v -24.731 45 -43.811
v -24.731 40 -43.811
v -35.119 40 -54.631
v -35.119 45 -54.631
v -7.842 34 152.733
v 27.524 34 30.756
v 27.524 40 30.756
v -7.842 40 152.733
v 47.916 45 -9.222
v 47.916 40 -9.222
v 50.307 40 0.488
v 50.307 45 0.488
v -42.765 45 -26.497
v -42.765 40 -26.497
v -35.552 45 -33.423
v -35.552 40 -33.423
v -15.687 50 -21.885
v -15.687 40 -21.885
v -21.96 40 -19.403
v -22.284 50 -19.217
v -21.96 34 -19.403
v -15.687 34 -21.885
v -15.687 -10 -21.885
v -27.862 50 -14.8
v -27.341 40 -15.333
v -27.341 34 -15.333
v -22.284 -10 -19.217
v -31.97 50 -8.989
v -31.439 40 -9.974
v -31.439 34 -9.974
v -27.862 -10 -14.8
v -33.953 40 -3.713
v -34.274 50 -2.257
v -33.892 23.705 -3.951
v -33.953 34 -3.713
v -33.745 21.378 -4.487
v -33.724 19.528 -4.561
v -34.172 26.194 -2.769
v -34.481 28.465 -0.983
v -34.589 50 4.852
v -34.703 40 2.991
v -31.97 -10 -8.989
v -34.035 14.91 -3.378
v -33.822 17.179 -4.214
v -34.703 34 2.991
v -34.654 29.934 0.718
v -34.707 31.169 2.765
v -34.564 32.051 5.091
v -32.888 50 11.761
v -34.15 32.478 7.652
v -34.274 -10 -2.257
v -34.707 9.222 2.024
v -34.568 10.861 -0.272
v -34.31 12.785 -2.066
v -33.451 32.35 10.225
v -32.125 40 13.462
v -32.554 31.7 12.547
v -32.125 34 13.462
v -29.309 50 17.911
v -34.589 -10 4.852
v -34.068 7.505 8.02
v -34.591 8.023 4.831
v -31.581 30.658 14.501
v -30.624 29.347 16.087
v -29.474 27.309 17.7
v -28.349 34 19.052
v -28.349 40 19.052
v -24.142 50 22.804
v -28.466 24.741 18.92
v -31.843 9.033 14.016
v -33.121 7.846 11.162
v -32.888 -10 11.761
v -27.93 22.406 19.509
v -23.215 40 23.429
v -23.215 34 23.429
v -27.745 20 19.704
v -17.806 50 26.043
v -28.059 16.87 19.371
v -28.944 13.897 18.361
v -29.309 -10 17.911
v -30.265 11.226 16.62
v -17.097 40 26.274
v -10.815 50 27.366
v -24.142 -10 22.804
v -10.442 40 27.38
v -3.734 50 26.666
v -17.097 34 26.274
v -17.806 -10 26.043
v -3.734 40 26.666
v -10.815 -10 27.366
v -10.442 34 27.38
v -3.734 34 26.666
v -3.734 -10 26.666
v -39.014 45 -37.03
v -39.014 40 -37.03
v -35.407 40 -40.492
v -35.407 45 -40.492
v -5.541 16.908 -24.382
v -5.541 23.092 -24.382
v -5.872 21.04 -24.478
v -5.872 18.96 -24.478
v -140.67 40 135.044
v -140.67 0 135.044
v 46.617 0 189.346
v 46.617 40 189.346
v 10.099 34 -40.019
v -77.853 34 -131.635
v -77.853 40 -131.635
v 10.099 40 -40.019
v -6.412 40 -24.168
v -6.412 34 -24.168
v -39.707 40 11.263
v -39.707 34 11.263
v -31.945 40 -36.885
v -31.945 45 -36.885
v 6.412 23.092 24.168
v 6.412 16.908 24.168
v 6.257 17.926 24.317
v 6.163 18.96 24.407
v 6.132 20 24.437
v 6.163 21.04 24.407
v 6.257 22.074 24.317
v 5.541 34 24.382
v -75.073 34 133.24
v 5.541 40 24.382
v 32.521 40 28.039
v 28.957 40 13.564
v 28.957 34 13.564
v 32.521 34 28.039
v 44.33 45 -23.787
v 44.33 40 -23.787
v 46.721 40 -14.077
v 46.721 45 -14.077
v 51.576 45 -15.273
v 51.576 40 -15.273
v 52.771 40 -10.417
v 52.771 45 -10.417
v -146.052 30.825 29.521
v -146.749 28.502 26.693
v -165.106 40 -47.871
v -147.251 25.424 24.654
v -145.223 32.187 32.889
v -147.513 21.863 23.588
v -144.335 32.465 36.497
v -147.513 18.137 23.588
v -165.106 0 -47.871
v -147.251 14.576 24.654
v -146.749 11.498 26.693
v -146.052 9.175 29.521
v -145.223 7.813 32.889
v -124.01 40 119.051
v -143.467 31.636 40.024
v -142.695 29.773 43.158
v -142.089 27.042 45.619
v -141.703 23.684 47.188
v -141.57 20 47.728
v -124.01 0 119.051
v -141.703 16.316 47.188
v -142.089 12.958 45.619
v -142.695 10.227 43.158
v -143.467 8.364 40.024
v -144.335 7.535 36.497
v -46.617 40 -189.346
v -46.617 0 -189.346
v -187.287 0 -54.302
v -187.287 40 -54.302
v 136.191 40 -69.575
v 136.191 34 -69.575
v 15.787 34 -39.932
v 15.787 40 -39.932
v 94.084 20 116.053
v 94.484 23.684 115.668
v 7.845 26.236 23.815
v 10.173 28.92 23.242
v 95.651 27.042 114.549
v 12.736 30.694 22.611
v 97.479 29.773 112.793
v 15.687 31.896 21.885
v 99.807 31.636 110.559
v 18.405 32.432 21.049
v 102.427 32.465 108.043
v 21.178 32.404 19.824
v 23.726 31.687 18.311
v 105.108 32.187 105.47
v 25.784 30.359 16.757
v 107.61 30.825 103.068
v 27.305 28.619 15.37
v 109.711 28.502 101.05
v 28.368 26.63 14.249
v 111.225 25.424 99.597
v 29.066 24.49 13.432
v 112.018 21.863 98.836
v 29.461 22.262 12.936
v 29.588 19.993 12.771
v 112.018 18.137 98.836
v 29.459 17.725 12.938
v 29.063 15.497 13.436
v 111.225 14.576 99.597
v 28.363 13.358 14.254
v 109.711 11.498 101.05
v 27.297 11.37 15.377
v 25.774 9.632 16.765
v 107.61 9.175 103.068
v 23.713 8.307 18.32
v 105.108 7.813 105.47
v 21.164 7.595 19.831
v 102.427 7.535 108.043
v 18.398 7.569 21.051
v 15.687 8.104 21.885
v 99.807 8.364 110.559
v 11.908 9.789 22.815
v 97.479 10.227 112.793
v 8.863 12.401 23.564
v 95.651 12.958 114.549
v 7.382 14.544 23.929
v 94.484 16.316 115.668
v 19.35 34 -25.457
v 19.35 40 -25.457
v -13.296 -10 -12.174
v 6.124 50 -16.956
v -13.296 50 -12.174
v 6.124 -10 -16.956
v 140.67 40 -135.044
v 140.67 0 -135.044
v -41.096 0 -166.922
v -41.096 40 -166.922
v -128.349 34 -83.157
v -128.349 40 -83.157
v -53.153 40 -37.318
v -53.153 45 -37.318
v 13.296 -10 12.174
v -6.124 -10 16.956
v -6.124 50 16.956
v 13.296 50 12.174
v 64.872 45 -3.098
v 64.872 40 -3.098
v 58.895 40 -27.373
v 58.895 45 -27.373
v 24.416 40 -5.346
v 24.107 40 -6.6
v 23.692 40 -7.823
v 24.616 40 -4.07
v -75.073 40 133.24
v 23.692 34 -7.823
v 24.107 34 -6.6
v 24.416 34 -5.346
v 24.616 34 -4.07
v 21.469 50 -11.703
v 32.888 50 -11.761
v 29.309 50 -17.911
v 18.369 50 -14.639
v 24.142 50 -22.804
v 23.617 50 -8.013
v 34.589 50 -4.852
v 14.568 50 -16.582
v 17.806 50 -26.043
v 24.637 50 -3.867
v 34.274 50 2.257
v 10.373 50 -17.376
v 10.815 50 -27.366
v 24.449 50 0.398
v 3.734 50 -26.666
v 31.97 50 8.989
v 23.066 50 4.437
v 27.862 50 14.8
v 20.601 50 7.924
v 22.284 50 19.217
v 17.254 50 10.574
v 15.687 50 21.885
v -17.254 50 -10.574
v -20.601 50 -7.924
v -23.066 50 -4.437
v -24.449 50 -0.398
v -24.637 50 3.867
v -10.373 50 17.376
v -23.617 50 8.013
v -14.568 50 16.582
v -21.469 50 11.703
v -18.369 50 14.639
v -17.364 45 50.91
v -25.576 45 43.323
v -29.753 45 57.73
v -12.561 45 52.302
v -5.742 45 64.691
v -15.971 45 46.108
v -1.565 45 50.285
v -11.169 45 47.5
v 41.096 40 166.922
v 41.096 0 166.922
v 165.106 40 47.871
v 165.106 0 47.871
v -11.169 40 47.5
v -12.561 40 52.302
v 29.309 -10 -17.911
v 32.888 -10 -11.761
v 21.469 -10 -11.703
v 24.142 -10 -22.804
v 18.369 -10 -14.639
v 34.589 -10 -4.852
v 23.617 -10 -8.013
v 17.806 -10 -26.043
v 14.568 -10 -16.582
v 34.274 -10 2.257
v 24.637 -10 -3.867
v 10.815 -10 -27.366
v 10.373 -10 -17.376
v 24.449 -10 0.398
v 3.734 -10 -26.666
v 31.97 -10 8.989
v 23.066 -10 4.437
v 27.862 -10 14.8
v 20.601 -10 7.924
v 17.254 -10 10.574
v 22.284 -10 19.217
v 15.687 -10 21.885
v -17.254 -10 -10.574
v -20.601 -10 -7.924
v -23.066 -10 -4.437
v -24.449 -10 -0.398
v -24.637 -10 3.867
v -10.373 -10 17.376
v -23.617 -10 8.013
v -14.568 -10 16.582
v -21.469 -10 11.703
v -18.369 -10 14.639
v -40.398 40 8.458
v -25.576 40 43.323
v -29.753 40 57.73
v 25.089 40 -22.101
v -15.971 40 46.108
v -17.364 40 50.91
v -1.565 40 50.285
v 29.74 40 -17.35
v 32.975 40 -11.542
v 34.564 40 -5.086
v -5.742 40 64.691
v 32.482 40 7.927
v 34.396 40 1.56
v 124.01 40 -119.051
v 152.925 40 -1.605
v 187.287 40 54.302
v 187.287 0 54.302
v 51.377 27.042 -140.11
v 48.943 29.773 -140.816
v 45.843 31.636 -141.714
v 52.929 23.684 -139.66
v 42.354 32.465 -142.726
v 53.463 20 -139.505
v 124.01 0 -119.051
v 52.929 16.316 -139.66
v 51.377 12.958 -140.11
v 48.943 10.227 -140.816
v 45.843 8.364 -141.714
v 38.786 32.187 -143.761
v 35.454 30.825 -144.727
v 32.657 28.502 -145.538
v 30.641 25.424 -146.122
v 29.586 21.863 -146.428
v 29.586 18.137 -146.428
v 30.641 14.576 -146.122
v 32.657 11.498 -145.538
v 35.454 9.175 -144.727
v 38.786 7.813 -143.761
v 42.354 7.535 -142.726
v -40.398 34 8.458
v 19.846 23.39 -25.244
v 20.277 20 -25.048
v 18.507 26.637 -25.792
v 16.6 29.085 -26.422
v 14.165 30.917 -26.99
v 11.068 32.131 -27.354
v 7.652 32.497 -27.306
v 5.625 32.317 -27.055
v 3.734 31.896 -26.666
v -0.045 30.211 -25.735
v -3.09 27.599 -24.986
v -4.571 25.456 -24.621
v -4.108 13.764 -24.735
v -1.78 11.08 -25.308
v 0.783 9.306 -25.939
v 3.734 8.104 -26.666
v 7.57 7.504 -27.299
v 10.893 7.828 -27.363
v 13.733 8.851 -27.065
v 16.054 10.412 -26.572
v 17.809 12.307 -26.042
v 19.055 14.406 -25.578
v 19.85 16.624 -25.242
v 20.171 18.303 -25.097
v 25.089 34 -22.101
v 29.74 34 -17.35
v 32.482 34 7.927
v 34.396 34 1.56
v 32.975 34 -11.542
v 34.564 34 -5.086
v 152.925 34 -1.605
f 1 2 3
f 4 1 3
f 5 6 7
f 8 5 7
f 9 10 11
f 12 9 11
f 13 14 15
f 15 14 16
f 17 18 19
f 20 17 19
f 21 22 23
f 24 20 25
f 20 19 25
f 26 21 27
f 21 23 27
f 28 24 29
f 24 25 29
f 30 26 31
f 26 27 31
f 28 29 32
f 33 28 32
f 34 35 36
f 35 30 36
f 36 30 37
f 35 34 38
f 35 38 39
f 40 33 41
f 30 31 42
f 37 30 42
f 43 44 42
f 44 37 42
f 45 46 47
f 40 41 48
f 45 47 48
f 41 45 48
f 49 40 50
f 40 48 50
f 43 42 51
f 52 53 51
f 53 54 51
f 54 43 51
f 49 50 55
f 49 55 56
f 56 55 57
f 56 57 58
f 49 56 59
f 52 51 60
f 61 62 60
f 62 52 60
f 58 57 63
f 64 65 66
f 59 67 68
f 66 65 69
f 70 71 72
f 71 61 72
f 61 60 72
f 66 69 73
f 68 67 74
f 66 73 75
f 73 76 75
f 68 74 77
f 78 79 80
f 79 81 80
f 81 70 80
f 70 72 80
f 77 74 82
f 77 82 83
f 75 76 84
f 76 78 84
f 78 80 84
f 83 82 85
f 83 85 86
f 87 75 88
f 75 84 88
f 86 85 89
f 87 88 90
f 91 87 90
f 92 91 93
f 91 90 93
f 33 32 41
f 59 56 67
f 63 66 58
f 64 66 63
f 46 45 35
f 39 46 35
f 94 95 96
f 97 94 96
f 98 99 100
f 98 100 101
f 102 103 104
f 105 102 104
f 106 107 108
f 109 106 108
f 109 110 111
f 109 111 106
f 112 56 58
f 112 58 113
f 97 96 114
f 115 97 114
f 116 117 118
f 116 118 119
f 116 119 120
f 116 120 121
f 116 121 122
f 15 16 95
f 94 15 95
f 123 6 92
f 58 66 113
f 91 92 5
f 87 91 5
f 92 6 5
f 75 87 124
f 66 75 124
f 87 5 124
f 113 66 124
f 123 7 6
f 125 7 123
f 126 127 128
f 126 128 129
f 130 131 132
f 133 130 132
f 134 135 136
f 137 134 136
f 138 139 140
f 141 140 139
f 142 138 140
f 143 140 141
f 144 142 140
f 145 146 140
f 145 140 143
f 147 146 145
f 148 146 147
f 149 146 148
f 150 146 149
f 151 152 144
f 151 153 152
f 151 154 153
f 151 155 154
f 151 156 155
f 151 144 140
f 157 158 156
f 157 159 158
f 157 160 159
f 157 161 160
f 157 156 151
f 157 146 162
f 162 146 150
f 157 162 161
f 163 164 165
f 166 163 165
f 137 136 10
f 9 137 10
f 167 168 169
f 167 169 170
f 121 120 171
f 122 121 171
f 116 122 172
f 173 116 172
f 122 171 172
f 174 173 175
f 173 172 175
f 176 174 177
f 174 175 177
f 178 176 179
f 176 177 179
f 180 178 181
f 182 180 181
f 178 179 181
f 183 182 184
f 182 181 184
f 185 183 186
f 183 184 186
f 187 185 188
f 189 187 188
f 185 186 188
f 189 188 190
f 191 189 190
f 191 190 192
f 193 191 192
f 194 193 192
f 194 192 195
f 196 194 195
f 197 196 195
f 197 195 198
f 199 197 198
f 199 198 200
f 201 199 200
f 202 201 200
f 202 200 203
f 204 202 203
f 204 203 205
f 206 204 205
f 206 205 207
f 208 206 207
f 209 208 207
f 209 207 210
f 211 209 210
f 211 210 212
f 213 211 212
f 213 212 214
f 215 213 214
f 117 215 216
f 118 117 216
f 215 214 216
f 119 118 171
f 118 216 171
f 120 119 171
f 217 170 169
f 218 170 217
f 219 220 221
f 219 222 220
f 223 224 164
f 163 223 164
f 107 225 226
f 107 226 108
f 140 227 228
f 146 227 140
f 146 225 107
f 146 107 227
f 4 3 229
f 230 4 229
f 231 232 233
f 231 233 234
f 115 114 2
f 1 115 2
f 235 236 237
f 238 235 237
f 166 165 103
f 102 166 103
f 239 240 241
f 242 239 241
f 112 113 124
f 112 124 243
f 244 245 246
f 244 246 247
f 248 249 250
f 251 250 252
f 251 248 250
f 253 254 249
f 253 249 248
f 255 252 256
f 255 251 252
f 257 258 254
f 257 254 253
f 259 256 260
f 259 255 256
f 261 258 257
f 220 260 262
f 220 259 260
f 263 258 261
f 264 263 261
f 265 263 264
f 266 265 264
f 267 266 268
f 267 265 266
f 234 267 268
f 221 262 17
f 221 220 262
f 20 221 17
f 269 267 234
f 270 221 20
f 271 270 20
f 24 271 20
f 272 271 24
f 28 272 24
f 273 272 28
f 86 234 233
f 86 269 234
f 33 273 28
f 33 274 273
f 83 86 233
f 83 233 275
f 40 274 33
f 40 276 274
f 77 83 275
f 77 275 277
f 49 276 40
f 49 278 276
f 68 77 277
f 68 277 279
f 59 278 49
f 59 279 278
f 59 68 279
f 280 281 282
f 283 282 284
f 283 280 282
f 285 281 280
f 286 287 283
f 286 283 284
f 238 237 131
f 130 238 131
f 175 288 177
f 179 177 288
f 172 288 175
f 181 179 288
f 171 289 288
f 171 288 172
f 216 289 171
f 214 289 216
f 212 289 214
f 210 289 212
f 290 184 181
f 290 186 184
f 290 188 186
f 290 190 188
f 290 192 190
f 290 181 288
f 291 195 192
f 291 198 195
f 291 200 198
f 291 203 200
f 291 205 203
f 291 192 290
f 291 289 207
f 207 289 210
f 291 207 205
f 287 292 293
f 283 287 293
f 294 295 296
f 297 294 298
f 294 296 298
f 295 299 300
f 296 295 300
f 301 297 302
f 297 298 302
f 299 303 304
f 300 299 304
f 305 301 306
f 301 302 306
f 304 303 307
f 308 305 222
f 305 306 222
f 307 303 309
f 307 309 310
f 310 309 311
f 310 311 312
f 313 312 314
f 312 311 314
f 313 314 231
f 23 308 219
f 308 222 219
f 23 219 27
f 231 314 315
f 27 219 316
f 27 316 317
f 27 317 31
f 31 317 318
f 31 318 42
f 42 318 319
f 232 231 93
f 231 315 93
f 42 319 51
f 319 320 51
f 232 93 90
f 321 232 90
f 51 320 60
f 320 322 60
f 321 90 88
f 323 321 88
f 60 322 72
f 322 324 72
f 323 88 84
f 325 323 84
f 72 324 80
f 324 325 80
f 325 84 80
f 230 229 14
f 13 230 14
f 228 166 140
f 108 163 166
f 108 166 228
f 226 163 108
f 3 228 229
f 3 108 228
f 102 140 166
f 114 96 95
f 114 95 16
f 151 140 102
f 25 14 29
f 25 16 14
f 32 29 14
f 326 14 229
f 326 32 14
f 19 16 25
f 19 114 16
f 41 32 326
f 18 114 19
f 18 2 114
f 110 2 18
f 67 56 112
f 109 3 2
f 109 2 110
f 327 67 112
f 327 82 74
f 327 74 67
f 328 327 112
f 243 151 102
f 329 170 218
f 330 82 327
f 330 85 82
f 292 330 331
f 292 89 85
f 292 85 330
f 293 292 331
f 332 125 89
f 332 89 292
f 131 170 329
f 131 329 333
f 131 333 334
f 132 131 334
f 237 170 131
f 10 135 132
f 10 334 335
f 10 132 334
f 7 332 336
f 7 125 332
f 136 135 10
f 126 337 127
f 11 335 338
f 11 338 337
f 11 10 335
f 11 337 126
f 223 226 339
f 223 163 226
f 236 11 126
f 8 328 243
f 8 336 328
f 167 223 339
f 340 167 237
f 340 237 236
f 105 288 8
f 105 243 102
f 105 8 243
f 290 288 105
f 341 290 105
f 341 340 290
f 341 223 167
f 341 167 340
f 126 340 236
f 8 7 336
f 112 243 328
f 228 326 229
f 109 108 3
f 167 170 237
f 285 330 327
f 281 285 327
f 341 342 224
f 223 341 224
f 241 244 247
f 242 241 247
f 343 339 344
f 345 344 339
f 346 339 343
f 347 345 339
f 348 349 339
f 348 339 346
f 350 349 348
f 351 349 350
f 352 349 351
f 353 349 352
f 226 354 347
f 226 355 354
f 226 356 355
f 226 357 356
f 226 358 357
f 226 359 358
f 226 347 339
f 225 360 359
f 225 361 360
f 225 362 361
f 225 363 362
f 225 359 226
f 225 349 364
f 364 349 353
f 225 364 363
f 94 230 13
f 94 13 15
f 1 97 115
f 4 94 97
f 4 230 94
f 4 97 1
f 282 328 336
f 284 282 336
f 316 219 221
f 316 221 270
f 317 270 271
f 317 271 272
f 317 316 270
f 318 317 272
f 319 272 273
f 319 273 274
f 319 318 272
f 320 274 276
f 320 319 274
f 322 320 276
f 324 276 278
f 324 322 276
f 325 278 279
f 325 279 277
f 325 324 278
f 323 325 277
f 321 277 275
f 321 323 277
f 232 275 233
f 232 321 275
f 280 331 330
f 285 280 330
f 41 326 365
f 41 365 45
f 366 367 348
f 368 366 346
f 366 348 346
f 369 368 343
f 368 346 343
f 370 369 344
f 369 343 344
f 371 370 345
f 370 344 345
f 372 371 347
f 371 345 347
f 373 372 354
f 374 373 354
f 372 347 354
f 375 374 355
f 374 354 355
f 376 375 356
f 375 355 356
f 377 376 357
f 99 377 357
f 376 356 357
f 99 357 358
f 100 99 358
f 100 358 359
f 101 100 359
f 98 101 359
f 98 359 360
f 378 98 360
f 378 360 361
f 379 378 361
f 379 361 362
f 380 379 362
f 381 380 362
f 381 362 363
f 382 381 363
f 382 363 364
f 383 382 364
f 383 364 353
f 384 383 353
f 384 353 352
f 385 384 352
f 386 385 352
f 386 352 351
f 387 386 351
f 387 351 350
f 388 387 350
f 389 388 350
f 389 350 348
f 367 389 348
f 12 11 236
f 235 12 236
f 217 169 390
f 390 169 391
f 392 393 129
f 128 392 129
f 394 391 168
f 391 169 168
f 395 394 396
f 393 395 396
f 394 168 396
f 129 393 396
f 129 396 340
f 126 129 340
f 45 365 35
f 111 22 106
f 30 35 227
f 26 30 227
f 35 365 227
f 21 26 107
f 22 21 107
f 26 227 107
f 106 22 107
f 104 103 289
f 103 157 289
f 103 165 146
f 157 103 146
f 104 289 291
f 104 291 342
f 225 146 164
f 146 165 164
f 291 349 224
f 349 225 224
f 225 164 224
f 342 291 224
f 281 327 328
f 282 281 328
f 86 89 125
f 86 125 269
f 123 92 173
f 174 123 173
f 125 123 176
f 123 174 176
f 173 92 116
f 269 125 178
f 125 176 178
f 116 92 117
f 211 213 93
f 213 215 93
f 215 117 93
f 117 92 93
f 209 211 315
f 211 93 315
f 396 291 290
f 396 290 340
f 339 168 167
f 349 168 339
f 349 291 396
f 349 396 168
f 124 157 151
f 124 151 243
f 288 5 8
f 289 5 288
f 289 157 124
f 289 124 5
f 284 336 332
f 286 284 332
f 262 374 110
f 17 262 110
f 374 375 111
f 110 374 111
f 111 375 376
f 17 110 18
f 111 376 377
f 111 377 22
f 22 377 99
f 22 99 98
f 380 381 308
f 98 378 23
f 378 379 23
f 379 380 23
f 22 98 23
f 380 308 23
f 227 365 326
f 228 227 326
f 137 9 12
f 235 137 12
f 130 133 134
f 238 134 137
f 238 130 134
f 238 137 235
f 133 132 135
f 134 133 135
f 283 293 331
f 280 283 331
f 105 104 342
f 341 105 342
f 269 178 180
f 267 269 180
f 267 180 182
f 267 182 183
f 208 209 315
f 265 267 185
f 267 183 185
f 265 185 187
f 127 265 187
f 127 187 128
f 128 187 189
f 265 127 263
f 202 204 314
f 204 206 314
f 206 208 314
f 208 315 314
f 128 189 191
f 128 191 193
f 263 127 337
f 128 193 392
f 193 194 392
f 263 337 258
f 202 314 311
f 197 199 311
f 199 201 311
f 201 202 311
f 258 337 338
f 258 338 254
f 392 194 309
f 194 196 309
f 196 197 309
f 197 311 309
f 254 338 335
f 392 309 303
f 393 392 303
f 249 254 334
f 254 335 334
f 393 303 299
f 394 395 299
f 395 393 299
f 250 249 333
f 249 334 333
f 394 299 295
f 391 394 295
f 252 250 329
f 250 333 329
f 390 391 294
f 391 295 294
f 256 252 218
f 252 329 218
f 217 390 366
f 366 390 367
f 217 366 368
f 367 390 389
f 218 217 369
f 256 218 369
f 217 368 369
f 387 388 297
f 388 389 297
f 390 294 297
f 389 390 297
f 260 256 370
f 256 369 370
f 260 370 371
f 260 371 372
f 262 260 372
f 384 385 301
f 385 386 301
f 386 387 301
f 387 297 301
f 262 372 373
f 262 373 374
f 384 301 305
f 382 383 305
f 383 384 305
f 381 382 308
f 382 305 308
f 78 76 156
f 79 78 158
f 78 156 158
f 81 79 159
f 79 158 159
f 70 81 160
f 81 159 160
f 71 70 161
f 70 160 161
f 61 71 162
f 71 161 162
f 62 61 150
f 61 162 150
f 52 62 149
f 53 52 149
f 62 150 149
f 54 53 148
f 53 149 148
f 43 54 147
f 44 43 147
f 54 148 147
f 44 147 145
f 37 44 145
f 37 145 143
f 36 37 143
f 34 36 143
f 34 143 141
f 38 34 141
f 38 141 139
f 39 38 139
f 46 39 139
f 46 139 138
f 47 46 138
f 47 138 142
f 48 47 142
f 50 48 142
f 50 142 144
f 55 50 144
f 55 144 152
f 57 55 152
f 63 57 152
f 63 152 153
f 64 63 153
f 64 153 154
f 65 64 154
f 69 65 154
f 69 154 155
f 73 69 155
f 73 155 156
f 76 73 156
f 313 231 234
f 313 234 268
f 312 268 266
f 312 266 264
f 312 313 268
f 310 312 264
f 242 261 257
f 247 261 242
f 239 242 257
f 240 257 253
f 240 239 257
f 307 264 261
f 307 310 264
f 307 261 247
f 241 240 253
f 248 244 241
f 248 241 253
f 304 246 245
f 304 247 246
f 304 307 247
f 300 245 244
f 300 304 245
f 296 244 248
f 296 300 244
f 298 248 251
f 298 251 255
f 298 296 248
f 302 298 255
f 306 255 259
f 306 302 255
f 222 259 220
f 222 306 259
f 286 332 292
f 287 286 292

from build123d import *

# Parameters (mm, degrees)
BOSS_EXTRUDE5_DEPTH      = 40
BOSS_EXTRUDE9_DEPTH      = 10
BOSS_EXTRUDE9_DEPTH_BACK = 50
BOSS_EXTRUDE10_DEPTH     = 120
SKETCH5_R                = 12.5
BOSS_EXTRUDE11_DEPTH     = 127
BOSS_EXTRUDE12_DEPTH     = 127
SKETCH8_W                = 70
SKETCH8_H                = 6
BOSS_EXTRUDE14_DEPTH     = 127
SKETCH9_W                = 70
SKETCH9_H                = 6
BOSS_EXTRUDE15_DEPTH     = 127
SKETCH10_W               = 70
SKETCH10_H               = 6
BOSS_EXTRUDE16_DEPTH     = 124
EXTRUDE_THIN1_DEPTH      = 5


with BuildPart() as part:
    # Sketch1 → Boss-Extrude5 (new body)
    with BuildSketch(Plane(origin=(0, 0, 0), x_dir=(1, 0, 0), z_dir=(0, 1, 0))):
        Polygon((-140.670056302, -135.044197431), (46.616677458, -189.345941025), (187.28673376, -54.301743594), (140.670056302, 135.044197431), (-46.616677458, 189.345941025), (-187.28673376, 54.301743594), align=None)
        Polygon((165.106211473, -47.870743331), (124.010385559, 119.050801792), (-41.095825913, 166.921545124), (-165.106211473, 47.870743331), (-124.010385559, -119.050801792), (41.095825913, -166.921545124), align=None, mode=Mode.SUBTRACT)
    extrude(amount=BOSS_EXTRUDE5_DEPTH)



with BuildPart() as body_2:
    # Sketch3 → Boss-Extrude9 (new body, two sides)
    with BuildSketch(Plane.XZ) as boss_extrude9_sk:
        with BuildLine():
            Line((3.733551148, -26.665719488), (-15.686545368, -21.8845218))
            ThreePointArc((-15.686545368, -21.8845218), (-33.985168902, 8.367095954), (-3.733551148, 26.665719488))
            Line((-3.733551148, 26.665719488), (15.686545368, 21.8845218))
            ThreePointArc((15.686545368, 21.8845218), (33.985168902, -8.367095954), (3.733551148, -26.665719488))
        make_face()
        with BuildLine():
            Line((6.124149992, -16.955671231), (-13.295946524, -12.174473543))
            ThreePointArc((-13.295946524, -12.174473543), (-24.275120644, 5.97649711), (-6.124149992, 16.955671231))
            Line((-6.124149992, 16.955671231), (13.295946524, 12.174473543))
            ThreePointArc((13.295946524, 12.174473543), (24.275120644, -5.97649711), (6.124149992, -16.955671231))
        make_face(mode=Mode.SUBTRACT)
    extrude(amount=BOSS_EXTRUDE9_DEPTH)
    extrude(boss_extrude9_sk.sketch, amount=-BOSS_EXTRUDE9_DEPTH_BACK)


with BuildPart() as part_1:
    add(part.part)

    add(body_2.part)  # Boss-Extrude10 merges body 2
    # Sketch4 → Boss-Extrude10 (add)
    with BuildSketch(Plane(origin=(-144.558298516, 0, 35.590029231), x_dir=(-0.239059884, 0, -0.971004826), z_dir=(0.971004826, 0, -0.239059884))):
        with BuildLine():
            ThreePointArc((12.5, 20), (0, 32.5), (-12.5, 20))
            Line((-12.5, 20), (12.5, 20))
        make_face()
        with BuildLine():
            Line((12.5, 20), (-12.5, 20))
            ThreePointArc((-12.5, 20), (0, 7.5), (12.5, 20))
        make_face()
    extrude(amount=BOSS_EXTRUDE10_DEPTH)

    # Sketch5 → Boss-Extrude11 (add)
    with BuildSketch(Plane(origin=(41.457279823, 0, -142.986173458), x_dir=(0.960444789, 0, 0.27847048), z_dir=(-0.27847048, 0, 0.960444789))):
        with Locations((0, 20)):
            Circle(SKETCH5_R)
    extrude(amount=BOSS_EXTRUDE11_DEPTH)

    # Sketch6 → Boss-Extrude12 (add)
    with BuildSketch(Plane(origin=(103.101018693, 0, 107.396144227), x_dir=(-0.721384904, 0, 0.692534346), z_dir=(-0.692534346, 0, -0.721384904))):
        with BuildLine():
            ThreePointArc((-12.5, 20), (0, 7.5), (12.5, 20))
            Line((12.5, 20), (-12.5, 20))
        make_face()
        with BuildLine():
            Line((-12.5, 20), (12.5, 20))
            ThreePointArc((12.5, 20), (0, 32.5), (-12.5, 20))
        make_face()
    extrude(amount=BOSS_EXTRUDE12_DEPTH)

    # Sketch8 → Boss-Extrude14 (add)
    with BuildSketch(Plane(origin=(-103.101018693, 0, -107.396144227), x_dir=(0.721384904, 0, -0.692534346), z_dir=(0.692534346, 0, 0.721384904))):
        with Locations((0, 37)):
            Rectangle(SKETCH8_W, SKETCH8_H)
    extrude(amount=BOSS_EXTRUDE14_DEPTH)

    # Sketch9 → Boss-Extrude15 (add)
    with BuildSketch(Plane(origin=(-41.457279823, 0, 142.986173458), x_dir=(-0.960444789, 0, -0.27847048), z_dir=(0.27847048, 0, -0.960444789))):
        with Locations((0, 37)):
            Rectangle(SKETCH9_W, SKETCH9_H)
    extrude(amount=BOSS_EXTRUDE15_DEPTH)

    # Sketch10 → Boss-Extrude16 (add)
    with BuildSketch(Plane(origin=(144.558298516, 0, -35.590029231), x_dir=(0.239059884, 0, 0.971004826), z_dir=(-0.971004826, 0, 0.239059884))):
        with Locations((0, 37)):
            Rectangle(SKETCH10_W, SKETCH10_H)
    extrude(amount=BOSS_EXTRUDE16_DEPTH)

    # Sketch14 → Extrude-Thin1 (add)
    with BuildSketch(Plane(origin=(0, 40, 0), x_dir=(1, 0, 0), z_dir=(0, 1, 0))):
        Polygon((50.306594431, -0.487856845), (64.871666817, 3.098041421), (58.895169707, 27.373162065), (44.330097321, 23.787263799), (46.720696165, 14.077215541), (51.575720293, 15.272514963), (52.771019715, 10.417490835), (47.915995587, 9.222191413), align=None)
        Polygon((-25.575793637, -43.322860332), (-29.752850836, -57.72953216), (-5.741731123, -64.691294159), (-1.564673924, -50.284622331), (-11.169121809, -47.499917532), (-12.561474209, -52.302141474), (-17.363698151, -50.909789074), (-15.971345751, -46.107565132), align=None)
        Polygon((-24.730800794, 43.810717177), (-35.118815981, 54.631490739), (-53.153438584, 37.318132094), (-42.765423397, 26.497358532), (-35.551574356, 33.42270199), (-39.014246085, 37.029626511), (-35.407321564, 40.49229824), (-31.944649835, 36.885373719), align=None)
    extrude(amount=EXTRUDE_THIN1_DEPTH)


solid = part_1.part
